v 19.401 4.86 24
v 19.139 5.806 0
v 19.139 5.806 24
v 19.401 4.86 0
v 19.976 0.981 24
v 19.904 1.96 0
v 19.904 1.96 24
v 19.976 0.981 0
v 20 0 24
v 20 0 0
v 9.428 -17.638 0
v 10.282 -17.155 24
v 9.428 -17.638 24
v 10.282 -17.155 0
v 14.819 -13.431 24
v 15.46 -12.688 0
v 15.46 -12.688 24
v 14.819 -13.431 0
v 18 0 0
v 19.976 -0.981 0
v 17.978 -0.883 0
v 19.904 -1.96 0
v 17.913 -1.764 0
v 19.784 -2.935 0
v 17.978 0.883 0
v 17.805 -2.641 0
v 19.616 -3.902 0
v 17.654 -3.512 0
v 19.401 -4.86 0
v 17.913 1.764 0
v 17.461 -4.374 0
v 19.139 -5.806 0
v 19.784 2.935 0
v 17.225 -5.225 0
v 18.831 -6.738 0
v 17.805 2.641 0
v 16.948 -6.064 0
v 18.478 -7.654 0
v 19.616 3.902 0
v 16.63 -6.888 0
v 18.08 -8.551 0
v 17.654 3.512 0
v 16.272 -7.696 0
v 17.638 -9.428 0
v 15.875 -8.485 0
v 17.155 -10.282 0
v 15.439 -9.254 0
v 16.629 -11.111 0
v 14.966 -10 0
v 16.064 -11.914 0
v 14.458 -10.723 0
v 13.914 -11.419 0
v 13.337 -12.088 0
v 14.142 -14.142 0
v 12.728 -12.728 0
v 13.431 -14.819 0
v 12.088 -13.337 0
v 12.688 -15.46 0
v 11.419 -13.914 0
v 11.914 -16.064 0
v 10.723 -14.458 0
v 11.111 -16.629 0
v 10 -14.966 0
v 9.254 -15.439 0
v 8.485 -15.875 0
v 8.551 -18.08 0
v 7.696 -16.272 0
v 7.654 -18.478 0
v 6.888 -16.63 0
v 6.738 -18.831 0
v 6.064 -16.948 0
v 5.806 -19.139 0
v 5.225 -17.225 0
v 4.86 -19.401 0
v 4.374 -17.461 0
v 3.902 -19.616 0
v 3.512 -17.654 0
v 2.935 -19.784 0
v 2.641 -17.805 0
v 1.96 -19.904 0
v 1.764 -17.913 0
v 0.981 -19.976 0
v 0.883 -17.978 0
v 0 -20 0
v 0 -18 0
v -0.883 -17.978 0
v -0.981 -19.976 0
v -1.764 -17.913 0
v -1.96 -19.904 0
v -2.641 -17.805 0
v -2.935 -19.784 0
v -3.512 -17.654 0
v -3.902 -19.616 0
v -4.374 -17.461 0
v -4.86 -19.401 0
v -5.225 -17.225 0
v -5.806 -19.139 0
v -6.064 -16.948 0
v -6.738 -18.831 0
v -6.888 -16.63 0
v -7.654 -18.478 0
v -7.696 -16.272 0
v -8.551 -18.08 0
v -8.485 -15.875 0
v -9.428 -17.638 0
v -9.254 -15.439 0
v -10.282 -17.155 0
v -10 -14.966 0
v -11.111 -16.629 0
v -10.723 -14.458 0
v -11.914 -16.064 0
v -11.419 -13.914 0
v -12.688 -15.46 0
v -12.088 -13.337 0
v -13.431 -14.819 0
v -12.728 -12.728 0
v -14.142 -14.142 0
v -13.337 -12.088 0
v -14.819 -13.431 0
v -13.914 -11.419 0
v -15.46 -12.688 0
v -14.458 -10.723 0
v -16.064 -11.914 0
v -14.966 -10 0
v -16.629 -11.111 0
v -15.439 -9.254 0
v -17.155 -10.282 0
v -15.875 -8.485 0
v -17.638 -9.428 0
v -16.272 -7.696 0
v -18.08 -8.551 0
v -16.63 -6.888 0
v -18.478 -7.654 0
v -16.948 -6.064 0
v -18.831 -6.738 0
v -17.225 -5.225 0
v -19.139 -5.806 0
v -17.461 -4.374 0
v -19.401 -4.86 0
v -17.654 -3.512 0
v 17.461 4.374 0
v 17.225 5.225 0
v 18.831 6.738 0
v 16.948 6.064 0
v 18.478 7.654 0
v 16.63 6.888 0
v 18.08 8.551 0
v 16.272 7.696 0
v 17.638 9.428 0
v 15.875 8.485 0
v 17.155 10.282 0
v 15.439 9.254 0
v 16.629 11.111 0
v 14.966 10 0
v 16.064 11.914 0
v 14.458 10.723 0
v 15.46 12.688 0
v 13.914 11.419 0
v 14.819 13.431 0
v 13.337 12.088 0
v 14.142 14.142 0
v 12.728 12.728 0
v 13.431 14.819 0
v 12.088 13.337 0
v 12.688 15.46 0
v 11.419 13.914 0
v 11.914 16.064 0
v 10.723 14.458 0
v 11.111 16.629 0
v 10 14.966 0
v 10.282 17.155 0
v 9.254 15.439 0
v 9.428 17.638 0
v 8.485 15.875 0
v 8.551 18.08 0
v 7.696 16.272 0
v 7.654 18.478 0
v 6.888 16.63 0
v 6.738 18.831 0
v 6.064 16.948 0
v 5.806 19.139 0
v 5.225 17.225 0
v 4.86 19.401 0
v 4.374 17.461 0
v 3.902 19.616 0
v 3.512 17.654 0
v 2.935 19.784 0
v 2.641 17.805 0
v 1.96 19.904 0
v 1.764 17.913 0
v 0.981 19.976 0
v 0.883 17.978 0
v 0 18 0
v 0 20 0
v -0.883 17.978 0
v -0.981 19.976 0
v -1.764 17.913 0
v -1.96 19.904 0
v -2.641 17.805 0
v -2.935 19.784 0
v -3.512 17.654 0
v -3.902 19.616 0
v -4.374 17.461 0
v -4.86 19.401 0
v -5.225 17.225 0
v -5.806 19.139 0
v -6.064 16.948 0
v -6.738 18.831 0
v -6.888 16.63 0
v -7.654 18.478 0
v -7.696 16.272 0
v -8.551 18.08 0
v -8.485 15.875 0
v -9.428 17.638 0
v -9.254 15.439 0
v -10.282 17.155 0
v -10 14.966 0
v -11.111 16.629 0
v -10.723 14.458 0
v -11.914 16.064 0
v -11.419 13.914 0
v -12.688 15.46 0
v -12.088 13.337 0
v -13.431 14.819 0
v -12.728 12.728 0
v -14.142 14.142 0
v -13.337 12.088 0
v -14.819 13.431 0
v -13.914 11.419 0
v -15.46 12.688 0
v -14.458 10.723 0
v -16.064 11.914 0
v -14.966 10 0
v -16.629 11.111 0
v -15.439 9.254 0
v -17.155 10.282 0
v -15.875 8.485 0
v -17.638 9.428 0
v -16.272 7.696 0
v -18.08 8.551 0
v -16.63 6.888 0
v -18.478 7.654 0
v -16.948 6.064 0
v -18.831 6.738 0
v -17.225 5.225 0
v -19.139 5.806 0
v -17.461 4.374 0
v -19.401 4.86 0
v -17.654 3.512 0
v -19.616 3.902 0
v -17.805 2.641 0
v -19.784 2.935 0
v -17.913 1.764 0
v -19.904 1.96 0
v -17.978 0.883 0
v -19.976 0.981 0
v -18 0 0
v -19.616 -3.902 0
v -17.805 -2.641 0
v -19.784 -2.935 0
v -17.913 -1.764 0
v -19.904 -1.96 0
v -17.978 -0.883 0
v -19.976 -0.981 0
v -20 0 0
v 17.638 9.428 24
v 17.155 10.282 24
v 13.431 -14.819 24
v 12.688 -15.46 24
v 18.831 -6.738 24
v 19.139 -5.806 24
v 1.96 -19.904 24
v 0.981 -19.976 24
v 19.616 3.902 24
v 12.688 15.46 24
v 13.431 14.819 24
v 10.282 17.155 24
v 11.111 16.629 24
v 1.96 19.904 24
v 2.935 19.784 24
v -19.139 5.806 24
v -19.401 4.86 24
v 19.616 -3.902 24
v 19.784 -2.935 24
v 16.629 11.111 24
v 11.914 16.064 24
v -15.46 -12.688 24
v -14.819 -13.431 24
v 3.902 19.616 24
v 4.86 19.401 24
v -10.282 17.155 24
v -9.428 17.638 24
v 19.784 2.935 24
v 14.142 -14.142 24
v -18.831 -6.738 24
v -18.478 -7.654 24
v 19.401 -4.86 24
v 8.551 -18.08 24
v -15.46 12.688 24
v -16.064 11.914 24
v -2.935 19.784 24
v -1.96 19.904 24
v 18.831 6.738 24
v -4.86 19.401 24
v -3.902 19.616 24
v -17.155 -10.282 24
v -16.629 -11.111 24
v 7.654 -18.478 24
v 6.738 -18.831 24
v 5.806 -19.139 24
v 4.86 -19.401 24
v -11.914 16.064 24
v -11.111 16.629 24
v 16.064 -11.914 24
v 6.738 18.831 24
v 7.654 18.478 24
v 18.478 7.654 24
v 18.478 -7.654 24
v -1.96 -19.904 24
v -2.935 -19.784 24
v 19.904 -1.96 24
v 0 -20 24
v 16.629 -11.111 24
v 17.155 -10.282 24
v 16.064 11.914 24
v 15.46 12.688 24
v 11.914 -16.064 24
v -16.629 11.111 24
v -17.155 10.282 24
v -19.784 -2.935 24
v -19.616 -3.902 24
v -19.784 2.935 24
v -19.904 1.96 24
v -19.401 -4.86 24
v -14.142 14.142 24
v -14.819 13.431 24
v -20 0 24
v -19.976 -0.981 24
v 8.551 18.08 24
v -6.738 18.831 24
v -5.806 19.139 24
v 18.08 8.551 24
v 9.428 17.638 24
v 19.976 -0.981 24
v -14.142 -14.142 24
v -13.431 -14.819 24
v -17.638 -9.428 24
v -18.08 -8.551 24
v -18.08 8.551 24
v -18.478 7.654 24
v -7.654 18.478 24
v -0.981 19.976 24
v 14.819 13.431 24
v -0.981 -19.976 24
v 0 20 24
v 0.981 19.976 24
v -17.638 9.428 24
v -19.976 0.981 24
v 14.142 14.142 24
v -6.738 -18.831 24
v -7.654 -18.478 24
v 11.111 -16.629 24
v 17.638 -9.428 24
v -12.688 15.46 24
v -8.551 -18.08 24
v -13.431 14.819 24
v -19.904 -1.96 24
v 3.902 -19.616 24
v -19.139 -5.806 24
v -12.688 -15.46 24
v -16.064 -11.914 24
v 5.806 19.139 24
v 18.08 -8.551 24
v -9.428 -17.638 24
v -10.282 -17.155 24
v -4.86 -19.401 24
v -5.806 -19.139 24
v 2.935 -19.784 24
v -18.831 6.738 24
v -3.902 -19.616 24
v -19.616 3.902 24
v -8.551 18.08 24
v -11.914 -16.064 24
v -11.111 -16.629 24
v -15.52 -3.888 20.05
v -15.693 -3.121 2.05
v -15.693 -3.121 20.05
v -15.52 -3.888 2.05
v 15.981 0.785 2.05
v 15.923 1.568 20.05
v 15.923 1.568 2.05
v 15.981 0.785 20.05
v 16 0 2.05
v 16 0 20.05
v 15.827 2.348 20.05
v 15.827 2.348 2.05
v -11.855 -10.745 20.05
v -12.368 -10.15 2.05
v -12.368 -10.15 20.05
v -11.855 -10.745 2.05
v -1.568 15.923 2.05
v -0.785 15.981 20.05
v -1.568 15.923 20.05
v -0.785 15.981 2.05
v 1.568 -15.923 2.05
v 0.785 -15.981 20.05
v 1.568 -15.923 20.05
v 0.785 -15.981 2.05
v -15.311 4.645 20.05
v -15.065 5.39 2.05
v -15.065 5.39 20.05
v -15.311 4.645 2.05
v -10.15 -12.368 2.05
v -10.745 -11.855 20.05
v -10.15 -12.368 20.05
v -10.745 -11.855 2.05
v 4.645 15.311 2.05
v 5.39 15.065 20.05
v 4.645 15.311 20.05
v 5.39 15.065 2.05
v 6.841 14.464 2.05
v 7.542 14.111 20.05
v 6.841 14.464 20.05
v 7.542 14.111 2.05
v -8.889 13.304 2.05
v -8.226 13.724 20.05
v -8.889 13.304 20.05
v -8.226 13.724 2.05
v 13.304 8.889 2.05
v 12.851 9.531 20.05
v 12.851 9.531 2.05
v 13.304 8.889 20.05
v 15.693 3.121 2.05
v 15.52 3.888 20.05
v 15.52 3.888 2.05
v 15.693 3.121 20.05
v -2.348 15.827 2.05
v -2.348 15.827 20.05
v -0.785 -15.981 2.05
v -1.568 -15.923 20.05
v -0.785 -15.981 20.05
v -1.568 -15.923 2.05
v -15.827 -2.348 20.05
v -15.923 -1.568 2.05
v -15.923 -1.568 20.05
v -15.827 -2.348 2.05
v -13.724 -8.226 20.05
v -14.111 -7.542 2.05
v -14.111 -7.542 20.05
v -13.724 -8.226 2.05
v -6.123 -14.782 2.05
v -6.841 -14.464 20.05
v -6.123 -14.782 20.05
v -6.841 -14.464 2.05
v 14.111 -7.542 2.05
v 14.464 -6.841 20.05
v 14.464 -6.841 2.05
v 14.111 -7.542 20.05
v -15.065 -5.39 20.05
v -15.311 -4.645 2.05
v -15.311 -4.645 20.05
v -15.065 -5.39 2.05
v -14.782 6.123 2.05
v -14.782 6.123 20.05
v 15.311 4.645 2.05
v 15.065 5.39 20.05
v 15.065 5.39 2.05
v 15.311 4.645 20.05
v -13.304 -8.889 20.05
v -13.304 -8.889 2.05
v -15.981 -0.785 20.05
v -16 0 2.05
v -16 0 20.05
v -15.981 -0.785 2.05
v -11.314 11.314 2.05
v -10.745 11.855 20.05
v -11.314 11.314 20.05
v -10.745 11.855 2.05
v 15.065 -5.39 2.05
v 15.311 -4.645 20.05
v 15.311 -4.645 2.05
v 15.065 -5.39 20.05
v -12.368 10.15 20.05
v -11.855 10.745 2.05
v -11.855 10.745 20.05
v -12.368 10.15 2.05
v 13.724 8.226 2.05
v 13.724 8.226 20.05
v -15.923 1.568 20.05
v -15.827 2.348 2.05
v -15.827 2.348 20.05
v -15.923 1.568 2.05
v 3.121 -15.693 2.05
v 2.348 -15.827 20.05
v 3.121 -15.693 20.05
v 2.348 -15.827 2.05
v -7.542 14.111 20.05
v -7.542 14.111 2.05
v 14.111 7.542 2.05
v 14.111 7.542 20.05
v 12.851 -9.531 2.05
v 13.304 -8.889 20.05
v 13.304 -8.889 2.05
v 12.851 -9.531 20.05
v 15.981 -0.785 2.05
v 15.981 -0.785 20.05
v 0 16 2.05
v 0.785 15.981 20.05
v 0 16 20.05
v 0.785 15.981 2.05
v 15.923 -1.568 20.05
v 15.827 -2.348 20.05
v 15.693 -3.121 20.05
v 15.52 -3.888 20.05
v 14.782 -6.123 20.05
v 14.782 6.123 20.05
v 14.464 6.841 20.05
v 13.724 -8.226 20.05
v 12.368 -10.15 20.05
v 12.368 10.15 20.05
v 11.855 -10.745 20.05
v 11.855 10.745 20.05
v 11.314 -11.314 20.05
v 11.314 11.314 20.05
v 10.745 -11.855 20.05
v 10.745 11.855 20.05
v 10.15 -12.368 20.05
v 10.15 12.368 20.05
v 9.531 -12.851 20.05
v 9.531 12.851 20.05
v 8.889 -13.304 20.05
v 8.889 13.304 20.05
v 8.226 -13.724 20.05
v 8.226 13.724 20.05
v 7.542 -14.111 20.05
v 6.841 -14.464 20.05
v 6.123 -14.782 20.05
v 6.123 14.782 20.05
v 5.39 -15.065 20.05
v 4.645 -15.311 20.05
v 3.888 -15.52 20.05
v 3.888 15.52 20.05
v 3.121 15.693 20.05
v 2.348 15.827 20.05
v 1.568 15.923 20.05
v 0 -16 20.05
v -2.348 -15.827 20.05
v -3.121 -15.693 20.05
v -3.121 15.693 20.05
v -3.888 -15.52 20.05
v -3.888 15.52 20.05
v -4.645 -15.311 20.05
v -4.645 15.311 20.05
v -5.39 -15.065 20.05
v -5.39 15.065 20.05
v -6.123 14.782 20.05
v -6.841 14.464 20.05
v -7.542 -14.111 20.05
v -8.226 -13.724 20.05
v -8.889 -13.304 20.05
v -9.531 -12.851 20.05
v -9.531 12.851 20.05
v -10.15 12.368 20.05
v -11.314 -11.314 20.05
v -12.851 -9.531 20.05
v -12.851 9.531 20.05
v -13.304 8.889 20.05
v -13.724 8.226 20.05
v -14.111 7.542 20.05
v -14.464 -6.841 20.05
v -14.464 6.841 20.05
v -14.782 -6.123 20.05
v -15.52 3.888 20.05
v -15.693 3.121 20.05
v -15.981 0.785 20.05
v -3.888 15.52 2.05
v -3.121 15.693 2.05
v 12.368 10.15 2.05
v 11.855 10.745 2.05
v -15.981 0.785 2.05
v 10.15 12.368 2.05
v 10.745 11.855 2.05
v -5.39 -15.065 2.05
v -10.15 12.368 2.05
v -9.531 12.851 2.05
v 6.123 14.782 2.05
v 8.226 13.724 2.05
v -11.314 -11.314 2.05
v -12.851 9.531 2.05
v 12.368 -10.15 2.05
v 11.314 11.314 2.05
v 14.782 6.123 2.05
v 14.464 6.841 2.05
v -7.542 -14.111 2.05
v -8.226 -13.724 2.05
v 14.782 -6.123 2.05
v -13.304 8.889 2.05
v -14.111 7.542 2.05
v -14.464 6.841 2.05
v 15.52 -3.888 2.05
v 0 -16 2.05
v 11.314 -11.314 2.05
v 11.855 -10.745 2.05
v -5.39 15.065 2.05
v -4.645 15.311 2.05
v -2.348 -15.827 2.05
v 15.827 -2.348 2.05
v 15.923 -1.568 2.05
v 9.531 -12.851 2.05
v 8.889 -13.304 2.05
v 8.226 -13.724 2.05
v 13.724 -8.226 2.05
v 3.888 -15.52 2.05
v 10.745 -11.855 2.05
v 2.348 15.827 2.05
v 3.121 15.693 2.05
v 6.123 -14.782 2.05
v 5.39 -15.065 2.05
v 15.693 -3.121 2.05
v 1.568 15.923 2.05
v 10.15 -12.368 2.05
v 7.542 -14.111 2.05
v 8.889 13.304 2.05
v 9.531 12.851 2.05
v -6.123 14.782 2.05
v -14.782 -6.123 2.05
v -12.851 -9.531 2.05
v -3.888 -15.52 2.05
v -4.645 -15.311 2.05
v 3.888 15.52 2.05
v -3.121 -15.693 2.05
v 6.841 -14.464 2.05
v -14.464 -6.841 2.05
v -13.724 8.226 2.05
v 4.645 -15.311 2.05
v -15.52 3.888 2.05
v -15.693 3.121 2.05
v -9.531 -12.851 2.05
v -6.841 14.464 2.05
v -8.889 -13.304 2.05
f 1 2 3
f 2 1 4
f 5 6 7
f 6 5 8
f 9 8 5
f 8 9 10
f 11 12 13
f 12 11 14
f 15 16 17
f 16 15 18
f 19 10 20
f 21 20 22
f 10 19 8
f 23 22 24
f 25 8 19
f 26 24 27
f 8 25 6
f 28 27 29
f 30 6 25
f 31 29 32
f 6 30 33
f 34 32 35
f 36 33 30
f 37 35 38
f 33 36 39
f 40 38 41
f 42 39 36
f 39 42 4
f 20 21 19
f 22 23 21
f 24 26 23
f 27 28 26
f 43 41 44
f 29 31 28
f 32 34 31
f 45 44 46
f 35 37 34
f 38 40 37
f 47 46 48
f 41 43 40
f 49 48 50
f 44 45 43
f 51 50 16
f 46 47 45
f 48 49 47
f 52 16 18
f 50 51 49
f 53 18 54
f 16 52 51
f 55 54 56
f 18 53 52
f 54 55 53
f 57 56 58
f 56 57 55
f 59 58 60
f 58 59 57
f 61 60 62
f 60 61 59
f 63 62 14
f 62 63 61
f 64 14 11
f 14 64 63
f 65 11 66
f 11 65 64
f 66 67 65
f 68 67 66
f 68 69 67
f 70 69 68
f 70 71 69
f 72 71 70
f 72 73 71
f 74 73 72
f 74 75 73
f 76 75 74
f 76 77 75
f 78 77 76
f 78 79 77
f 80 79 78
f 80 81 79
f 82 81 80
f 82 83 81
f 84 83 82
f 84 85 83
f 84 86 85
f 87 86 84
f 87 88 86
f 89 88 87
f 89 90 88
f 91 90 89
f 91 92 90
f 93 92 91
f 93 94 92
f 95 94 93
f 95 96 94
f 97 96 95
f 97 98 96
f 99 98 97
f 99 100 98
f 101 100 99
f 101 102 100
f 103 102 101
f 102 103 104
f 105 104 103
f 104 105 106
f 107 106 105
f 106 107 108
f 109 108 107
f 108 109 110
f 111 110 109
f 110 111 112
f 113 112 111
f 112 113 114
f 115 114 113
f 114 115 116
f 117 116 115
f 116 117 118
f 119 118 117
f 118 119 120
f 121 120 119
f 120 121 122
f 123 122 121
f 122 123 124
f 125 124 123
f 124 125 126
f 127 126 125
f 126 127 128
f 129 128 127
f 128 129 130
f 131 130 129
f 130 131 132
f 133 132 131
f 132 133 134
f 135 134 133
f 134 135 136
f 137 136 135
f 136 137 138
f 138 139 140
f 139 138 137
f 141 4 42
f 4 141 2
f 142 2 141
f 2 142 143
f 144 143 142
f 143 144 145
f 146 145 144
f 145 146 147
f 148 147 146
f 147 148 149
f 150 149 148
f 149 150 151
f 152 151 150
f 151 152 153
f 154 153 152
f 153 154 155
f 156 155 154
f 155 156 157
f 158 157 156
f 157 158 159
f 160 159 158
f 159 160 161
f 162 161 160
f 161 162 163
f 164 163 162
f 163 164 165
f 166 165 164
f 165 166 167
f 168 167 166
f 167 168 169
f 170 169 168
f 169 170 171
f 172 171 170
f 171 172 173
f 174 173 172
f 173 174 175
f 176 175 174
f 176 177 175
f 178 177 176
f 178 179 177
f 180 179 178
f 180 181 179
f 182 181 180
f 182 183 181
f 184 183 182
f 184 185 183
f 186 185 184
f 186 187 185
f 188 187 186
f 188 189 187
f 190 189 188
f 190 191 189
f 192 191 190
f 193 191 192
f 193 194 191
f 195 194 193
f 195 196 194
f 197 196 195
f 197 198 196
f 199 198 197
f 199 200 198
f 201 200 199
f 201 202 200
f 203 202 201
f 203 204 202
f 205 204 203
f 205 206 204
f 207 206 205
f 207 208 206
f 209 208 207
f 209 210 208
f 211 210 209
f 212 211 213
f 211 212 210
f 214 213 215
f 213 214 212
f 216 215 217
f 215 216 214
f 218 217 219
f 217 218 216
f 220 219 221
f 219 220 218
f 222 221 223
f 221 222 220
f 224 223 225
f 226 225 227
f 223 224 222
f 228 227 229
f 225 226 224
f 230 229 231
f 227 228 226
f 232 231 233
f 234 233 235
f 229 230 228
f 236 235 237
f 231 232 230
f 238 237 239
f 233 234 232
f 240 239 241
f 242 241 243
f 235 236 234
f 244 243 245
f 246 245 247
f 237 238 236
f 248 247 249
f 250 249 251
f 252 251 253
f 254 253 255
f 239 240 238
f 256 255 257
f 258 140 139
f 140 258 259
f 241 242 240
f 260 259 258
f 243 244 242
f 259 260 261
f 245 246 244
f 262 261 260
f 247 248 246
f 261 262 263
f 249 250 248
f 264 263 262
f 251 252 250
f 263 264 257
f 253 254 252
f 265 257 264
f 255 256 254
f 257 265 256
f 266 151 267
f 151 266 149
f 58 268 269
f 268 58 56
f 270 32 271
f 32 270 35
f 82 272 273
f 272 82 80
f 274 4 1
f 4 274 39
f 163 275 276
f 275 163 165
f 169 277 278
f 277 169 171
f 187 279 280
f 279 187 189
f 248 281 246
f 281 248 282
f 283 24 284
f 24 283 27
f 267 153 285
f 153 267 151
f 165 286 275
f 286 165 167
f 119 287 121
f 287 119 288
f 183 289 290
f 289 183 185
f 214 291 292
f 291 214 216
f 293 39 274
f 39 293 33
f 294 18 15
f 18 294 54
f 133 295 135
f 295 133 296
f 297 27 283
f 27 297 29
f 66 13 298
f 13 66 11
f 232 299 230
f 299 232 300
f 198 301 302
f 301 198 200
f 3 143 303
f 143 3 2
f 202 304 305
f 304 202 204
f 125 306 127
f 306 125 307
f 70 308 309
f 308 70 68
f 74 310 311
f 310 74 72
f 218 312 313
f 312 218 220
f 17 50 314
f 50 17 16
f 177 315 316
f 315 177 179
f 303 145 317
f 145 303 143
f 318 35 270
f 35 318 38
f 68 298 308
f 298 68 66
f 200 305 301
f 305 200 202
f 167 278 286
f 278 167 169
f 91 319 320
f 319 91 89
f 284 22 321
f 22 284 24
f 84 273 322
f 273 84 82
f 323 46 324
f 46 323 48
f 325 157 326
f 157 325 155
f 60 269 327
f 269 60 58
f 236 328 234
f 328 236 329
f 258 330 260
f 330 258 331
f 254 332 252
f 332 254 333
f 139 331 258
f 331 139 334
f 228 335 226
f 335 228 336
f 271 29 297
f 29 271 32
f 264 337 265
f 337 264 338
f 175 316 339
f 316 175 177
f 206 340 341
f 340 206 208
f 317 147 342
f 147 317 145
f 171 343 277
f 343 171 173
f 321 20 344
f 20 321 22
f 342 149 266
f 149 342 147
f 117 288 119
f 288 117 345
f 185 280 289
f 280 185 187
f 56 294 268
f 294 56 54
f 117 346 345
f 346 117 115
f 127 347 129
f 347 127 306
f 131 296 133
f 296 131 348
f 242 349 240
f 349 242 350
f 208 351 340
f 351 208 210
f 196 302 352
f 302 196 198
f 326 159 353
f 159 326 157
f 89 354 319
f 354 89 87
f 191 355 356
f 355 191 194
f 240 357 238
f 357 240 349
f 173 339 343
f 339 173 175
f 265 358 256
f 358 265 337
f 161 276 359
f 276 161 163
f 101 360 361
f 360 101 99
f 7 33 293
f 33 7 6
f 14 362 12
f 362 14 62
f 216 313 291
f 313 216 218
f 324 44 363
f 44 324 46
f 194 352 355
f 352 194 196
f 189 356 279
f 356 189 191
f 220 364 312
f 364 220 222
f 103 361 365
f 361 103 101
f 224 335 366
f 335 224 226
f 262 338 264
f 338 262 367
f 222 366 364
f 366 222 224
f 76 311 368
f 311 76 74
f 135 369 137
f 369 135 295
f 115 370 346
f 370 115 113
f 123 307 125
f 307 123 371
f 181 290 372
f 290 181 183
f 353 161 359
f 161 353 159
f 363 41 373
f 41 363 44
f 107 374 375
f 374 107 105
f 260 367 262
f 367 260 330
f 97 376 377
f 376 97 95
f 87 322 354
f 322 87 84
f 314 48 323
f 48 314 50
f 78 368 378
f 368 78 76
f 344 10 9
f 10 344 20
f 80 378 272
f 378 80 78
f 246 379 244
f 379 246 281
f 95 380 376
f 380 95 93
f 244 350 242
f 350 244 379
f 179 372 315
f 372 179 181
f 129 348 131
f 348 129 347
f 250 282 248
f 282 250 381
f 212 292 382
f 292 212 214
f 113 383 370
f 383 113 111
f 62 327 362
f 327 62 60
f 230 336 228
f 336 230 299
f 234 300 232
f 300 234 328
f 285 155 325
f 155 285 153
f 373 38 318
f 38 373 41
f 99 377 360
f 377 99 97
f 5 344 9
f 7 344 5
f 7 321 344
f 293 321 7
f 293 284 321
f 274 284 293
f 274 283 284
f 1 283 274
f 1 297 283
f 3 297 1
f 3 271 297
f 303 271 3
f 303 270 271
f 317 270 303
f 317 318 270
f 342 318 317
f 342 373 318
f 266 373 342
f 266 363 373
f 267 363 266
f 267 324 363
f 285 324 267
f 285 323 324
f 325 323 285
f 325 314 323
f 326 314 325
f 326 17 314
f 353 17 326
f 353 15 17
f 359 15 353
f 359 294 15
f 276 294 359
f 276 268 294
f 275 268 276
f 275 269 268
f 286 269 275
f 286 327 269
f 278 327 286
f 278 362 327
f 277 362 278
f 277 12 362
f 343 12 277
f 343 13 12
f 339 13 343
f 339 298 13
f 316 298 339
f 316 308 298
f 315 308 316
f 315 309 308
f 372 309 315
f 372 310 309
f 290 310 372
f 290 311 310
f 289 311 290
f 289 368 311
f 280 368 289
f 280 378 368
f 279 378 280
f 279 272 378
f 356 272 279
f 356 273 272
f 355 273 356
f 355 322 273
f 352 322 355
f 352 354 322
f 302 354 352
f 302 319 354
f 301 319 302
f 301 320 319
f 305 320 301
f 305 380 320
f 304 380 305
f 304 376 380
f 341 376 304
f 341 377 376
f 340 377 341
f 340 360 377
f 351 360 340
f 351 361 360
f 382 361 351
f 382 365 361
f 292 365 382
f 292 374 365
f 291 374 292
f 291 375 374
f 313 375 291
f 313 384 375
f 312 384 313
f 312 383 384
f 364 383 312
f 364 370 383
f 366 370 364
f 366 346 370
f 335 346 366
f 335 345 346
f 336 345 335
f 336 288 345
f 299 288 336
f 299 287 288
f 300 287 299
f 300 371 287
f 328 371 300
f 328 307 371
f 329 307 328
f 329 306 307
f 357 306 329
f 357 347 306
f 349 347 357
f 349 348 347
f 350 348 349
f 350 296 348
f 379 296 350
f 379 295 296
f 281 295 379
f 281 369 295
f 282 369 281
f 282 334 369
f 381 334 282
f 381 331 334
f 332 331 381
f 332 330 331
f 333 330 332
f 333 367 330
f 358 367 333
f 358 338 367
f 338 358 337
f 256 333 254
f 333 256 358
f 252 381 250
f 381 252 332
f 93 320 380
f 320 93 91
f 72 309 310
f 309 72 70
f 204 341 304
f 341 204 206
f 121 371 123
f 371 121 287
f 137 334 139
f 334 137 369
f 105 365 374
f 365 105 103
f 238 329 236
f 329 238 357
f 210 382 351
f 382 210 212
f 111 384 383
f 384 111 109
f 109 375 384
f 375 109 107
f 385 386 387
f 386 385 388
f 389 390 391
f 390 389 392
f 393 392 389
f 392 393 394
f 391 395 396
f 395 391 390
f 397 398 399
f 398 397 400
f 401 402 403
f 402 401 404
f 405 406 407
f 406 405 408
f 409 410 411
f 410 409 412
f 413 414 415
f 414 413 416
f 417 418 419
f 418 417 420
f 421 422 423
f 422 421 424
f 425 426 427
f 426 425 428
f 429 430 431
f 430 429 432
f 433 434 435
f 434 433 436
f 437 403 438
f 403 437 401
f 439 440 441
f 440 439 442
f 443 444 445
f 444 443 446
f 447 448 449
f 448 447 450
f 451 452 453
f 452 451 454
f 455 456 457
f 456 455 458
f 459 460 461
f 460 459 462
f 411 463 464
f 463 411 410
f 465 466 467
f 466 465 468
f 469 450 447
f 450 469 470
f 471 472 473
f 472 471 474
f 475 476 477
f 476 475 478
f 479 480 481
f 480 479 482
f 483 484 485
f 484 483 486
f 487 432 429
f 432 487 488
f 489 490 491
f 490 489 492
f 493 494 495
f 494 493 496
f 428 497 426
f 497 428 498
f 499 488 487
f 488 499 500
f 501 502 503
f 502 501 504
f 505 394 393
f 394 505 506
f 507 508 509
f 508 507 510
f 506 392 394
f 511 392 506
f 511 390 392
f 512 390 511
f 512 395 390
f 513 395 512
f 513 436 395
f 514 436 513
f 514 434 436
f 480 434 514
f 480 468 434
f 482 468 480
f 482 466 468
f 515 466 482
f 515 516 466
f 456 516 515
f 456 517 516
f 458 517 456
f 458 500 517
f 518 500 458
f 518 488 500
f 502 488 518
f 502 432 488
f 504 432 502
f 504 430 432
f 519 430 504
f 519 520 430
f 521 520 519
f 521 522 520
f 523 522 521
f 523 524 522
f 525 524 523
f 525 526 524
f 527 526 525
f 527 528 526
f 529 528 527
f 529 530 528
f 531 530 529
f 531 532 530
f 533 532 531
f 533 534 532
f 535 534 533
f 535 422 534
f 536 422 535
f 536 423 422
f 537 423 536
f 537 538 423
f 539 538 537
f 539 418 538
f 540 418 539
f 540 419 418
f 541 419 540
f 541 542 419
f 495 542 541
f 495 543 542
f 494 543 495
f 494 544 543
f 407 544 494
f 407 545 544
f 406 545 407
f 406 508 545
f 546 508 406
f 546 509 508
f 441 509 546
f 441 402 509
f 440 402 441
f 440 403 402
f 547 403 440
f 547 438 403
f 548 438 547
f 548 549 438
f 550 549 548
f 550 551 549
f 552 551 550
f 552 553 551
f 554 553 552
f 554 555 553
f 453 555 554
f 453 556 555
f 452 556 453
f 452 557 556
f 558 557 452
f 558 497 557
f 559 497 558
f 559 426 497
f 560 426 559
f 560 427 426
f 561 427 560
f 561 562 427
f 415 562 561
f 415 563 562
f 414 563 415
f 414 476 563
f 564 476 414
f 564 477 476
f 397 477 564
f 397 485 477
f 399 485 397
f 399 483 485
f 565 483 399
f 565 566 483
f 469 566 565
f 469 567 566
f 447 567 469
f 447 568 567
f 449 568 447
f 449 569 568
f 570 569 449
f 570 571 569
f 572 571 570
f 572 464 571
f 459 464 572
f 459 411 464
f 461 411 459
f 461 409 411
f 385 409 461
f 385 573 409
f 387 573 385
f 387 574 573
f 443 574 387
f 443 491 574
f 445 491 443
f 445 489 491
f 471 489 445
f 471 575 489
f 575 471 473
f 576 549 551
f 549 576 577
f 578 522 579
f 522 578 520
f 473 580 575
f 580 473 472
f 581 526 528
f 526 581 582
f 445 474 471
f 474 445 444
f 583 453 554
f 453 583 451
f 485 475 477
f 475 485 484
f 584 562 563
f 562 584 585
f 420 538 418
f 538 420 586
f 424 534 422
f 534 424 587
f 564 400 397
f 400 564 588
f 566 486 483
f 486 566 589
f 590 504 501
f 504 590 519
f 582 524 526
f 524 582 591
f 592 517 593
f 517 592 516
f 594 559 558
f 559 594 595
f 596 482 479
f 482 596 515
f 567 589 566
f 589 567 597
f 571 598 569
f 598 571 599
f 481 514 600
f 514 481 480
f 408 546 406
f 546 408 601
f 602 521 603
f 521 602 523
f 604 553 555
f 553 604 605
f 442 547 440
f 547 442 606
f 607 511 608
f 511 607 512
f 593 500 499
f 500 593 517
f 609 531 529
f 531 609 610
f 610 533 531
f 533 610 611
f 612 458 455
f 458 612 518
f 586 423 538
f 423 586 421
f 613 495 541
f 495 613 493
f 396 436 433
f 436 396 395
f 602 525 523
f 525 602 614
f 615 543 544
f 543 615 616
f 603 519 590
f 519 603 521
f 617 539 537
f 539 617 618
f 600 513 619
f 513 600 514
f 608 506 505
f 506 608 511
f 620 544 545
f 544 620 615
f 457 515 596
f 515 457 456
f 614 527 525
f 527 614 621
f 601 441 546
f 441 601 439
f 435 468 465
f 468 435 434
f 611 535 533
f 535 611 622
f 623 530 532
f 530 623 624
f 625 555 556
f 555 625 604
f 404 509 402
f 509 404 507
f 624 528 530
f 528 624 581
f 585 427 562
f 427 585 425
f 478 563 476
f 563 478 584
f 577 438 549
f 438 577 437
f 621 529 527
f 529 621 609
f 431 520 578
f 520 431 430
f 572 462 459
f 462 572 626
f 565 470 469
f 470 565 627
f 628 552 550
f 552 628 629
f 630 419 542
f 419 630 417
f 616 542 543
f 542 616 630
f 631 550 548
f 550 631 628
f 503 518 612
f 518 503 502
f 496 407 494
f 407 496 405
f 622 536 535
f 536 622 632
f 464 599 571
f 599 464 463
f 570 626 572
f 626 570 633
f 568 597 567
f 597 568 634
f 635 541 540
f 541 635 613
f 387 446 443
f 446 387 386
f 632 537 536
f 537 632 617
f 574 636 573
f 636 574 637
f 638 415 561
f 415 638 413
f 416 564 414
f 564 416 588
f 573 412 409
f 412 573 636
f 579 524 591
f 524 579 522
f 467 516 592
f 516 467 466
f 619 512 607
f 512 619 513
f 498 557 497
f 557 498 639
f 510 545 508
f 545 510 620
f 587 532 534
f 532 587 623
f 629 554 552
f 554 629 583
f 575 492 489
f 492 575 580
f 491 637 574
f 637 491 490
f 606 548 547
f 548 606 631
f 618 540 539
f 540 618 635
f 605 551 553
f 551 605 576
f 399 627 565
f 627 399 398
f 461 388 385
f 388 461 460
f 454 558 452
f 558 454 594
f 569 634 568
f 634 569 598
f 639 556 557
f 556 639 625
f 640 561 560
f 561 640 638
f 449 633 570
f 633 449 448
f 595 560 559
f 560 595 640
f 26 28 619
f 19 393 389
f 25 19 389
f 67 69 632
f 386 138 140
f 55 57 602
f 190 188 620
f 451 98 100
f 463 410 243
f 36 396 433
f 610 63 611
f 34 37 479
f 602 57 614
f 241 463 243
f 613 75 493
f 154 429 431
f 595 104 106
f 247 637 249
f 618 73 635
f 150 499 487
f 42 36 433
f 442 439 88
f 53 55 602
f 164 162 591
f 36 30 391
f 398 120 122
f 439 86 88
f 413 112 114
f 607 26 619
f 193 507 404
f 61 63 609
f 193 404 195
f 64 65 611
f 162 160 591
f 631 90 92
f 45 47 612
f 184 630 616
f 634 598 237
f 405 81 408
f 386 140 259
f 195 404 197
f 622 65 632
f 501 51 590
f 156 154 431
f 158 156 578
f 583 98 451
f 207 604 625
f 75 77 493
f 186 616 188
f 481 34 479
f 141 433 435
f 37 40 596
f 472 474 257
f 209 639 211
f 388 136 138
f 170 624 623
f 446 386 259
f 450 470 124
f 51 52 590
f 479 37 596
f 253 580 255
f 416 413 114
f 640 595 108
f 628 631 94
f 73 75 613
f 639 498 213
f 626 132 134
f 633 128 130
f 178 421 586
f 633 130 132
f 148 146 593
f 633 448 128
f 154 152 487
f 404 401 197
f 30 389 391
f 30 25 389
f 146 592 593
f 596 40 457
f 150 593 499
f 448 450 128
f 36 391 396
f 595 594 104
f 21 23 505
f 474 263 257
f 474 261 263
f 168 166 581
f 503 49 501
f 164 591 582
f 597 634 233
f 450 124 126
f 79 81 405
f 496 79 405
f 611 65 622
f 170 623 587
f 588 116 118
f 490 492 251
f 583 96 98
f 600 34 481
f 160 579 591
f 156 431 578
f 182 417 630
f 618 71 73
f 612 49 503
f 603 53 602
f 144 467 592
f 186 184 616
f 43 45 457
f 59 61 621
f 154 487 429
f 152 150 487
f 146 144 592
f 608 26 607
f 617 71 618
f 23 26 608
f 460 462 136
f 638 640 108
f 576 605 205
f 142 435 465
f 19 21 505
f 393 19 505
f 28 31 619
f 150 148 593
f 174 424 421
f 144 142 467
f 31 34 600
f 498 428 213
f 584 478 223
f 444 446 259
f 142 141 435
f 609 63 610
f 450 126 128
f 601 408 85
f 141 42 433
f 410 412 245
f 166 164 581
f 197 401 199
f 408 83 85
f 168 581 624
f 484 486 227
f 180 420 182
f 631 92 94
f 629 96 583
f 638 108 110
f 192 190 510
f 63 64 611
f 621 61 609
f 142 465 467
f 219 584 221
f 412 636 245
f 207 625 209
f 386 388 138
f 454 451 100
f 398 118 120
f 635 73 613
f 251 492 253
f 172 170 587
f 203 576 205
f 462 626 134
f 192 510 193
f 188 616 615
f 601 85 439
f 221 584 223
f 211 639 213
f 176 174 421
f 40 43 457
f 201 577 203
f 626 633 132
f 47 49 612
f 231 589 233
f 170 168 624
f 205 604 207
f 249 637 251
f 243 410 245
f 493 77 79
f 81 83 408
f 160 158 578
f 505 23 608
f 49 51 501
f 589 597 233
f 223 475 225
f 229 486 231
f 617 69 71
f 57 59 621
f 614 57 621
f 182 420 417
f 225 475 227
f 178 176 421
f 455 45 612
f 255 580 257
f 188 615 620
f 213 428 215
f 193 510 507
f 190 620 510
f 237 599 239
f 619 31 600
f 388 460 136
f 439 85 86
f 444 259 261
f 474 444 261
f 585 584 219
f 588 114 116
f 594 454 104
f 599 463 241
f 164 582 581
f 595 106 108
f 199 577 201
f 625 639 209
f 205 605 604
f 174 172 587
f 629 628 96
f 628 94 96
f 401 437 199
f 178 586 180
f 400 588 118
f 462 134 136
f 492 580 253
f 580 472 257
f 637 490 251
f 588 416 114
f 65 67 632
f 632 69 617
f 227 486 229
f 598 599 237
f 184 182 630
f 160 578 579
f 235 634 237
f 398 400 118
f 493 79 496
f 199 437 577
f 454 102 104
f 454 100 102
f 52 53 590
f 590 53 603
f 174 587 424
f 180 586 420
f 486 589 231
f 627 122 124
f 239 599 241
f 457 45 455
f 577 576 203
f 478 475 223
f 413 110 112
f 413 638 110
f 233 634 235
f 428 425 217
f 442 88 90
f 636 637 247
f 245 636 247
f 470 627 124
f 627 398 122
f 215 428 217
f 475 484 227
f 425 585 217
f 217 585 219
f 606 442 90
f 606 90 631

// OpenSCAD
// HT 32 pipe end cap (one connected solid)

// Parameters
pipe_outer_diameter = 32;     // OD of pipe
pipe_wall_thickness = 3;      // not directly used (kept for reference)
cap_wall_thickness  = 4;      // radial wall thickness of cap
insertion_depth     = 20;     // socket depth
lead_in_chamfer     = 2;      // chamfer height

// Robustness / rendering
$fn = 128;
eps = 0.05;

// Derived
cap_outer_diameter = pipe_outer_diameter + 2 * cap_wall_thickness;
cap_height         = insertion_depth + cap_wall_thickness;

// Main module
module ht_pipe_end_cap() {
    difference() {
        // Outer solid
        cylinder(h = cap_height, d = cap_outer_diameter, center = false);

        // Inner socket: start at opening (z=0) and stop before the closed end,
        // leaving a bottom thickness of cap_wall_thickness.
        cylinder(h = insertion_depth + eps, d = pipe_outer_diameter, center = false);

        // Lead-in chamfer at the opening (z=0..lead_in_chamfer)
        cylinder(
            h  = lead_in_chamfer + eps,
            d1 = pipe_outer_diameter + 2 * lead_in_chamfer,
            d2 = pipe_outer_diameter,
            center = false
        );
    }
}

ht_pipe_end_cap();
